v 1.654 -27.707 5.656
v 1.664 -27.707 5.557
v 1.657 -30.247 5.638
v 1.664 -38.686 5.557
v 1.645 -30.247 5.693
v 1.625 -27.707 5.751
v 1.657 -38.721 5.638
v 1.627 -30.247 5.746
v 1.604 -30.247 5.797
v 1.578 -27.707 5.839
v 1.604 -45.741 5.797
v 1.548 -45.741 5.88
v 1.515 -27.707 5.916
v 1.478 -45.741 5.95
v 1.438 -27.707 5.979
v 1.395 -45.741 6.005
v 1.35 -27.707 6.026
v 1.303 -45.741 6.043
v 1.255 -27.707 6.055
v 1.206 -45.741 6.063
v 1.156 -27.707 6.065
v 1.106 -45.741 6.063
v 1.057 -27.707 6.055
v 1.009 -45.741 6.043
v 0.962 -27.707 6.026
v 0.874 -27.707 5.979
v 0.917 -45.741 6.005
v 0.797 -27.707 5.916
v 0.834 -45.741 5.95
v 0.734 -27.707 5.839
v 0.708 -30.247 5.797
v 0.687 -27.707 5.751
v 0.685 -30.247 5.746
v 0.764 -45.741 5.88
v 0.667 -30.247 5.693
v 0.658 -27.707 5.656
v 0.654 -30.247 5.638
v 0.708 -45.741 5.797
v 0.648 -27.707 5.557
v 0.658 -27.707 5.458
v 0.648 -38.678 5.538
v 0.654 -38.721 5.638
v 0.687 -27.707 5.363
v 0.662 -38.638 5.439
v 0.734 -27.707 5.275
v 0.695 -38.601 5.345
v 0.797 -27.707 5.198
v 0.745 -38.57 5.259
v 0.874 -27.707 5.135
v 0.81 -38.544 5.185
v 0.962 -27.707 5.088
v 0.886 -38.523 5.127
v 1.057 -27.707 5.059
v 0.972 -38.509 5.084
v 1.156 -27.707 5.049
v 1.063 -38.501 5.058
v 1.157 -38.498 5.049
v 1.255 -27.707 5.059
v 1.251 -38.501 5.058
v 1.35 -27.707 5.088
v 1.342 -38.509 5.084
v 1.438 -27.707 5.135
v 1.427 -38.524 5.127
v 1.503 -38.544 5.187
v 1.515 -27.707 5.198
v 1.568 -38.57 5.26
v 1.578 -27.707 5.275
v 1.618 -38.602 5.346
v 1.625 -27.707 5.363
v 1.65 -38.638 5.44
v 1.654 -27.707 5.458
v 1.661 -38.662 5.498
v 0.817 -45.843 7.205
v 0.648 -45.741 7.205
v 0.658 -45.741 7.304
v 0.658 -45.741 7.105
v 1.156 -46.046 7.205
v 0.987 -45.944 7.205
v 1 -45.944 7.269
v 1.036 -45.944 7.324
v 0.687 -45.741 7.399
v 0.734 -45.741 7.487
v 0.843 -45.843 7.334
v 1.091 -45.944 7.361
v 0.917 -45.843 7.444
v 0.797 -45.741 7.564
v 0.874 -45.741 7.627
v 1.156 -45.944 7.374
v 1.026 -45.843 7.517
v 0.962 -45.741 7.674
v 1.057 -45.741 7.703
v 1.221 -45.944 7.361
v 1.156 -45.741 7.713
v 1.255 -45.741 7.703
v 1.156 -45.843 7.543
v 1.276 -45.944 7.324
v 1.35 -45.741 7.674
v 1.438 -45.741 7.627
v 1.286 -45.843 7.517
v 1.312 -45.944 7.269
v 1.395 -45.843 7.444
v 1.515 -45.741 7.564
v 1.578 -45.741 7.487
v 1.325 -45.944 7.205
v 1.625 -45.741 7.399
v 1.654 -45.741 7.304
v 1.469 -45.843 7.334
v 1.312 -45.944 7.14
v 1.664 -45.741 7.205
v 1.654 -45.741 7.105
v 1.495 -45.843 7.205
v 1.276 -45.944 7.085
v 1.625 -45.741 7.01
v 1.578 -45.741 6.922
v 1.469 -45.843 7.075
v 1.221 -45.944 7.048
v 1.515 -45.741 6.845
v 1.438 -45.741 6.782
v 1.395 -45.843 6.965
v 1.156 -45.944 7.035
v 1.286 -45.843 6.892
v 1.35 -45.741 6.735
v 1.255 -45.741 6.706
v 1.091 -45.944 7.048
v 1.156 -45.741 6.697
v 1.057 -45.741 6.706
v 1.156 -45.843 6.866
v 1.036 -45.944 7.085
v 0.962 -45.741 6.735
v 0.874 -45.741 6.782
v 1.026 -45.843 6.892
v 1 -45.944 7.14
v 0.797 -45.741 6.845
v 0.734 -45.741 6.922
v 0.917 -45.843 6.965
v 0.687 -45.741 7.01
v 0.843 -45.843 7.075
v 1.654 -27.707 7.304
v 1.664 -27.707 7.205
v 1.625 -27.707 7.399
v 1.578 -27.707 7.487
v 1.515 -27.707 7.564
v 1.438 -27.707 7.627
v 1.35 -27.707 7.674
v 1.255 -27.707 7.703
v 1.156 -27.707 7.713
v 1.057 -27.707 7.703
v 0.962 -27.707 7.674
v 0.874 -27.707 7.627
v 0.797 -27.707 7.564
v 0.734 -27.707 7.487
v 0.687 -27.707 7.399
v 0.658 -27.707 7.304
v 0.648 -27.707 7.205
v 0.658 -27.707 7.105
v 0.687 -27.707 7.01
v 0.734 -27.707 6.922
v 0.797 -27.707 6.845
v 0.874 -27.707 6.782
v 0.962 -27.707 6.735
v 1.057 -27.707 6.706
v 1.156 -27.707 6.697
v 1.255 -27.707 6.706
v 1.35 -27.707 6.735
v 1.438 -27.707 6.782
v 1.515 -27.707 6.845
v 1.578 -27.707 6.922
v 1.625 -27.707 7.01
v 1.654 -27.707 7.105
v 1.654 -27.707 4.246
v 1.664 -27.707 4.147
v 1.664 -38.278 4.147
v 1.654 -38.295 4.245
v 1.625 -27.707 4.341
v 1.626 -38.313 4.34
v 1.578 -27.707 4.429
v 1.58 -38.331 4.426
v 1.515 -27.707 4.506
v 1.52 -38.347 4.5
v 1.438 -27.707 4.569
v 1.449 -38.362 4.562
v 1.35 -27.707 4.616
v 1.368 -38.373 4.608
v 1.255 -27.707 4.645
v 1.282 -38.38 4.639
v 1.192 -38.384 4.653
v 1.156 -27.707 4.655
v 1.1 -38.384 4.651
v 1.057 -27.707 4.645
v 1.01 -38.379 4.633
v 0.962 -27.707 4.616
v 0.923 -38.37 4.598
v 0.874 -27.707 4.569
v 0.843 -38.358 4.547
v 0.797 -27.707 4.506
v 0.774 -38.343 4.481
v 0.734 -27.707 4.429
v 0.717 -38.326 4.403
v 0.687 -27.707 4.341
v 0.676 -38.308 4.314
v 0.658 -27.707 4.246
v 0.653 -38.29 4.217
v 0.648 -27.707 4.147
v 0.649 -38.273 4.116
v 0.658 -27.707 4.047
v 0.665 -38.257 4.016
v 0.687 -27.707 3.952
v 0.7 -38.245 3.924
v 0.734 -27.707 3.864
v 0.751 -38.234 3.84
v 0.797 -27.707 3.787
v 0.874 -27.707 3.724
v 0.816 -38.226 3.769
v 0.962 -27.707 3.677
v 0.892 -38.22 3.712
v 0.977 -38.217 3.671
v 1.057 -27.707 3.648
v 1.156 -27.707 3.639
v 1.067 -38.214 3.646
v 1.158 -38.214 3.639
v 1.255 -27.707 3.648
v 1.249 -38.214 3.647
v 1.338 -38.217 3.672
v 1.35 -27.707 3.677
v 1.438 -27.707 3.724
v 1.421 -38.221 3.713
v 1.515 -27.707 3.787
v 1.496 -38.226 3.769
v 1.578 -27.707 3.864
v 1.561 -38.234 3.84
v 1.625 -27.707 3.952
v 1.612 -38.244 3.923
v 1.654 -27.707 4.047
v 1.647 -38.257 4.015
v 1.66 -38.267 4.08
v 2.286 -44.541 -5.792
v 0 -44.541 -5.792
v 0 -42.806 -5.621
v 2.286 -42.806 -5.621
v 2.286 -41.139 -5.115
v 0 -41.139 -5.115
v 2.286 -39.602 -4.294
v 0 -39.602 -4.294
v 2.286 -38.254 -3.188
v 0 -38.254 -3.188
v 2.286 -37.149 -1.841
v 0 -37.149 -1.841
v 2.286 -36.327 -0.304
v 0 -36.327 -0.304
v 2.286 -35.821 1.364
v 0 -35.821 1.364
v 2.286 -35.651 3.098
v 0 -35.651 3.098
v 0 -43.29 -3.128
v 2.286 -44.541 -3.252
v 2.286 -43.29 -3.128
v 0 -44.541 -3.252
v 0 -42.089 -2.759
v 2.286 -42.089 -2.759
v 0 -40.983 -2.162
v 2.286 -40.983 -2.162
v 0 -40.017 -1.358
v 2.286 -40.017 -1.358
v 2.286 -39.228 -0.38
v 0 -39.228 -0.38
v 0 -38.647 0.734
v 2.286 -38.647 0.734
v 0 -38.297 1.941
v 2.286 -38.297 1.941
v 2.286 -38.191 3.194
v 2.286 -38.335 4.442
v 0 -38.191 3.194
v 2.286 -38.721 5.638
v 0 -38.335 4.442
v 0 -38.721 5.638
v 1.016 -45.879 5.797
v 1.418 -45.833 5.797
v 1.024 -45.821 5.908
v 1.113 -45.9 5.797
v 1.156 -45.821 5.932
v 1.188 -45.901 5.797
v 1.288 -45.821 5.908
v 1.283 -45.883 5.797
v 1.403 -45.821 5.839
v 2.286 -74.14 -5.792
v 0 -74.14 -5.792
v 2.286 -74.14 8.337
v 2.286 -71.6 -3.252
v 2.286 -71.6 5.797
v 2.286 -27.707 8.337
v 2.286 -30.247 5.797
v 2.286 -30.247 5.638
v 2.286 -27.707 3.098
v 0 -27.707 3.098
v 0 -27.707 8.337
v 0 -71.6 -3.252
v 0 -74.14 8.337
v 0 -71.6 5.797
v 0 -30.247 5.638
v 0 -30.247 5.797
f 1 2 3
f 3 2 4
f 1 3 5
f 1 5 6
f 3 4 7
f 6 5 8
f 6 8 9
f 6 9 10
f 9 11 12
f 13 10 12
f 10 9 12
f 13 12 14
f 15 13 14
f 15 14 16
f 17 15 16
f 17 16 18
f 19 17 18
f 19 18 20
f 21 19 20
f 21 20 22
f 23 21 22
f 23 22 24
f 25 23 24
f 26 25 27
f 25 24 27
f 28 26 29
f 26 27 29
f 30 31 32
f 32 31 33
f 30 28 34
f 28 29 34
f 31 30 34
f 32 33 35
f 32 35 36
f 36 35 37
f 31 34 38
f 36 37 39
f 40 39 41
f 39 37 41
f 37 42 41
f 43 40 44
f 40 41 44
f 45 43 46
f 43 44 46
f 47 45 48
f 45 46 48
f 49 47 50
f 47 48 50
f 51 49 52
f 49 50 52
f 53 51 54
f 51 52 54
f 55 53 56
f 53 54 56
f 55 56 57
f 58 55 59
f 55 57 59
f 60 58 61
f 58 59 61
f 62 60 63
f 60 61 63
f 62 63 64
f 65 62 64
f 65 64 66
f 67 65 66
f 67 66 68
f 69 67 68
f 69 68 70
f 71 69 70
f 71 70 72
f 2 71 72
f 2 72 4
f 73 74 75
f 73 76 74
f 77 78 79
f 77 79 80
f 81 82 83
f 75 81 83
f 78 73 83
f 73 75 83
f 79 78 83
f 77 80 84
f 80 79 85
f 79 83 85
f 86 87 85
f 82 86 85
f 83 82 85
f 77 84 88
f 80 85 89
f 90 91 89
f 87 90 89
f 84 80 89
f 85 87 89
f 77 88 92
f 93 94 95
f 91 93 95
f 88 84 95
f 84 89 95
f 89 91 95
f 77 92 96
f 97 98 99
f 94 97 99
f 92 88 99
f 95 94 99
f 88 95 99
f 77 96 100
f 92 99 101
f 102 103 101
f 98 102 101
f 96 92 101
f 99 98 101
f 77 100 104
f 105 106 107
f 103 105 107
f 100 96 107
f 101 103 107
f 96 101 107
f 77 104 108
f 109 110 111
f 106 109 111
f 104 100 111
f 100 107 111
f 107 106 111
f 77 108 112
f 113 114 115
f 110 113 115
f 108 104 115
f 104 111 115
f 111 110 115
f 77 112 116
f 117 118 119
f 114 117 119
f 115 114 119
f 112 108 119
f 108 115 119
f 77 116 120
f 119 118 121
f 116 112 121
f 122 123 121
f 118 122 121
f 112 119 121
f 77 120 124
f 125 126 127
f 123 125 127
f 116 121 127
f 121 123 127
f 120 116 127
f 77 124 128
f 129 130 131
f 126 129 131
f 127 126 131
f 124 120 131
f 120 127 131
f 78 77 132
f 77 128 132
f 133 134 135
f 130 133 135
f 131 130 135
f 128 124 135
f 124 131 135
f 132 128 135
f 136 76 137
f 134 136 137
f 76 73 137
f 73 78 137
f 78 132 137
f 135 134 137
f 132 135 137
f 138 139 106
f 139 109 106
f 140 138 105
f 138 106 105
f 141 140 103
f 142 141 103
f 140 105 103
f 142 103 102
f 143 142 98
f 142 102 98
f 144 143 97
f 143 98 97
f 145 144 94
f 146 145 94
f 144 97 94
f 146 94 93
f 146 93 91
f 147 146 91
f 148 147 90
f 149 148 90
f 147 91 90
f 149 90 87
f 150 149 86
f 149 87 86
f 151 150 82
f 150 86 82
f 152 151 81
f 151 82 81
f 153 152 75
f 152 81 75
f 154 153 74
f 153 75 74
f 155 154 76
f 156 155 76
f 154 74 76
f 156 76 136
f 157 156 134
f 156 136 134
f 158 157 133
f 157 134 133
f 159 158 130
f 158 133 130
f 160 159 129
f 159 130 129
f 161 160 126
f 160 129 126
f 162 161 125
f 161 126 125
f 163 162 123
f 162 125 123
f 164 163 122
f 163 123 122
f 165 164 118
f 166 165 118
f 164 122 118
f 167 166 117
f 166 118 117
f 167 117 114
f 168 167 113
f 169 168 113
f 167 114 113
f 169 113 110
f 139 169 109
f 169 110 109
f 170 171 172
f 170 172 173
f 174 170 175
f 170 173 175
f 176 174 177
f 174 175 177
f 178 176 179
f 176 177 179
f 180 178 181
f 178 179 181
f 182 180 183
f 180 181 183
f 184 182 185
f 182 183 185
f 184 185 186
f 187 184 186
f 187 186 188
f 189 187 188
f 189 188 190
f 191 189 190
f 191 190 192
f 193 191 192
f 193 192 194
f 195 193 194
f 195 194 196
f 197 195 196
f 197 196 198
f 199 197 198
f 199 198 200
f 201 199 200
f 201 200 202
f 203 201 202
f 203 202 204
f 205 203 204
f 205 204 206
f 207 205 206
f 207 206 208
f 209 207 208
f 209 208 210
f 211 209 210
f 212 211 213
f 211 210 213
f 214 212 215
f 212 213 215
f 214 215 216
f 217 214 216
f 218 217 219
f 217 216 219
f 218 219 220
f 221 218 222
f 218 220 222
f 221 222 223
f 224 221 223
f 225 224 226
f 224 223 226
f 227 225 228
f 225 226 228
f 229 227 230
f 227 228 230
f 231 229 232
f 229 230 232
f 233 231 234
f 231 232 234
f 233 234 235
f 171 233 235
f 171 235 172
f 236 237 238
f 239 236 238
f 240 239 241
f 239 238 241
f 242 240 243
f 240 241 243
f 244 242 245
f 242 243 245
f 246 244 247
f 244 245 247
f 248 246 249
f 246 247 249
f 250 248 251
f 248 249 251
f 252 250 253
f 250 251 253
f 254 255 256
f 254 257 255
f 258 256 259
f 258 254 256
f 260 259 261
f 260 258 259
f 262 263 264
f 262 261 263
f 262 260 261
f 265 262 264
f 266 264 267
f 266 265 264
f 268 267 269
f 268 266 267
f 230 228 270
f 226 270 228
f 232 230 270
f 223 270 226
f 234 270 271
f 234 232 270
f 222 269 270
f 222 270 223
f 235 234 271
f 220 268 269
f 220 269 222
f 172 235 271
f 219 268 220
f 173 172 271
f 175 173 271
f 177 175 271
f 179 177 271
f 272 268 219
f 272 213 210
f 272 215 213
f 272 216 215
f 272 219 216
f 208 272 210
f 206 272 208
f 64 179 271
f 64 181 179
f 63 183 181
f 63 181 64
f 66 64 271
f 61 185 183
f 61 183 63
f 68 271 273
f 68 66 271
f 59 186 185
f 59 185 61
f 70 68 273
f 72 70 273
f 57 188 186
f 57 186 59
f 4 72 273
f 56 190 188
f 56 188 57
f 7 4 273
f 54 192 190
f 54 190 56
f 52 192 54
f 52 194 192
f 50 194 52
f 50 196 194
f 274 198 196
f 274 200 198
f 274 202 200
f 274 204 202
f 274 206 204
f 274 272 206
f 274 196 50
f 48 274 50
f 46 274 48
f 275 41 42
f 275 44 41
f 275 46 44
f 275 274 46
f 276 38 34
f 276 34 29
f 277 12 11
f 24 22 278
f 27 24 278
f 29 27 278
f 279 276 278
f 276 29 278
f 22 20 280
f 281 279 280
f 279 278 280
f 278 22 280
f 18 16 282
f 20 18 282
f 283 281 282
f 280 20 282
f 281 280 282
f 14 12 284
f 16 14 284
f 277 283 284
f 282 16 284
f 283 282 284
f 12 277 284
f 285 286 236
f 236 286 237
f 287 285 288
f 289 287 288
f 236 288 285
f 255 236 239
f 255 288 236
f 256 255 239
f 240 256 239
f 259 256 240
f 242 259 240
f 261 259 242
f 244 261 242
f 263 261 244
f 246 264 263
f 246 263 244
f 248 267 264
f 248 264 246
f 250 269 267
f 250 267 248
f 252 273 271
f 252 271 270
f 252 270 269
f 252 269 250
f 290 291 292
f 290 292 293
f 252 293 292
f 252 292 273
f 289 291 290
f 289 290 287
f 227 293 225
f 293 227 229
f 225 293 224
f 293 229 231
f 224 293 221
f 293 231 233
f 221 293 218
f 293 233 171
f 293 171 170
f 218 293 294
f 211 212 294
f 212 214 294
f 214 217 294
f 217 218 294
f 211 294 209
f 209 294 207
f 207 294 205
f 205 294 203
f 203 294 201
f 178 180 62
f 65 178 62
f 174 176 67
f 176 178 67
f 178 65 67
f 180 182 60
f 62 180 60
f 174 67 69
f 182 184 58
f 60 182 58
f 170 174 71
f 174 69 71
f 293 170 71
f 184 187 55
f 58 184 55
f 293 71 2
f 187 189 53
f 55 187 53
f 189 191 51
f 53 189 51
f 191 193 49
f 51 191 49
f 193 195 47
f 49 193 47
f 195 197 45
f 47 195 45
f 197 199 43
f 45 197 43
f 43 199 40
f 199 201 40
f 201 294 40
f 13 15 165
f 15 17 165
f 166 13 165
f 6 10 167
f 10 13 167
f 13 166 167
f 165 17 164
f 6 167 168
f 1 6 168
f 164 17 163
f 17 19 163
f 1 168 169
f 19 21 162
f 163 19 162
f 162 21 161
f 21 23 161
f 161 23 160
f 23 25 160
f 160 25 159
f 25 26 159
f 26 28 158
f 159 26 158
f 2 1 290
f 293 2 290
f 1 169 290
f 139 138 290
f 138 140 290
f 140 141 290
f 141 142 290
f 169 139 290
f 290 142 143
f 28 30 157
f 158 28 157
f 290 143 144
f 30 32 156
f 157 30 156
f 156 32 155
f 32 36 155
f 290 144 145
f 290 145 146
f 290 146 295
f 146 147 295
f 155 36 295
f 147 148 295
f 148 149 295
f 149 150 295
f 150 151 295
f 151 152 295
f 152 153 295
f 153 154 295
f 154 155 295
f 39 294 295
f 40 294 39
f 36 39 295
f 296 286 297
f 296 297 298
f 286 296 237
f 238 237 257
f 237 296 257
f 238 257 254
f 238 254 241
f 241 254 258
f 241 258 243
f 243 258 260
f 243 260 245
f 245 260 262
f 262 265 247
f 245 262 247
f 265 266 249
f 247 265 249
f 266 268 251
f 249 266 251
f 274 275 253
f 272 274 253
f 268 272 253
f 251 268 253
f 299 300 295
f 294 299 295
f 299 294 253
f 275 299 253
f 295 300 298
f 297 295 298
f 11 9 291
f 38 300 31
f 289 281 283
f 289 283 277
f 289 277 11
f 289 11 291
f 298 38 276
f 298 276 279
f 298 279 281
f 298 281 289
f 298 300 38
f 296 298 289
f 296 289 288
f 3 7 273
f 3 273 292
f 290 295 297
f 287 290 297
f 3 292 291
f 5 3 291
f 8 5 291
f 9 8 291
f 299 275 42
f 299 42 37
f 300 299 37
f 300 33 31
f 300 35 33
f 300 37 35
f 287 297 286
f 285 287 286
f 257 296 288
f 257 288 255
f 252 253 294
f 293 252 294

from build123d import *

# Parameters (mm, degrees)
F1_DEPTH = 2.286
F2_T     = -2.54
F4_D     = 1.016
F4_DEPTH = 18.034
F4_TIP   = 0.3052371945


with BuildPart() as f1:
    # F0 (on Right) → F1 (new body)
    with BuildSketch(Plane.YZ):
        with BuildLine():
            Line((-35.6506742537, 8.3372171661), (-74.139625051, 8.3372171661))
            Line((-74.139625051, 8.3372171661), (-74.139625051, -5.7919719098))
            Line((-74.139625051, -5.7919719098), (-44.5406742537, -5.7919719098))
            ThreePointArc((-44.5406742537, -5.7919719098), (-38.254494969, -3.1881511945), (-35.6506742537, 3.0980280902))
            Line((-35.6506742537, 3.0980280902), (-35.6506742537, 8.3372171661))
        make_face()
        Polygon((-27.7069620788, 8.3372171661), (-35.6506742537, 3.0980280902), (-27.7069620788, 3.0980280902), align=None)
        Polygon((-27.7069620788, 8.3372171661), (-35.6506742537, 8.3372171661), (-35.6506742537, 3.0980280902), align=None)
    extrude(amount=F1_DEPTH)

    # F2
    f2_openings = [f1.faces().sort_by_distance(p)[0] for p in [
        (2.286, -53.710375, 1.749572),
        (0, -53.710375, 1.749572),
    ]]
    offset(amount=F2_T, openings=f2_openings, kind=Kind.INTERSECTION)

    # F4
    with Locations(Plane(origin=(0, -27.7069620788, 0), x_dir=(-1, 0, 0), z_dir=(0, 1, 0))):
        with Locations((-1.1559764389, 7.2045344859), (-1.1559764389, 5.5570374243), (-1.1559764389, 4.1465191171)):
            Hole(F4_D / 2, depth=F4_DEPTH)
            with Locations((0, 0, -(F4_DEPTH + F4_TIP / 2))):  # 118° drill point
                Cone(0, F4_D / 2, F4_TIP, mode=Mode.SUBTRACT)


solid = f1.part
